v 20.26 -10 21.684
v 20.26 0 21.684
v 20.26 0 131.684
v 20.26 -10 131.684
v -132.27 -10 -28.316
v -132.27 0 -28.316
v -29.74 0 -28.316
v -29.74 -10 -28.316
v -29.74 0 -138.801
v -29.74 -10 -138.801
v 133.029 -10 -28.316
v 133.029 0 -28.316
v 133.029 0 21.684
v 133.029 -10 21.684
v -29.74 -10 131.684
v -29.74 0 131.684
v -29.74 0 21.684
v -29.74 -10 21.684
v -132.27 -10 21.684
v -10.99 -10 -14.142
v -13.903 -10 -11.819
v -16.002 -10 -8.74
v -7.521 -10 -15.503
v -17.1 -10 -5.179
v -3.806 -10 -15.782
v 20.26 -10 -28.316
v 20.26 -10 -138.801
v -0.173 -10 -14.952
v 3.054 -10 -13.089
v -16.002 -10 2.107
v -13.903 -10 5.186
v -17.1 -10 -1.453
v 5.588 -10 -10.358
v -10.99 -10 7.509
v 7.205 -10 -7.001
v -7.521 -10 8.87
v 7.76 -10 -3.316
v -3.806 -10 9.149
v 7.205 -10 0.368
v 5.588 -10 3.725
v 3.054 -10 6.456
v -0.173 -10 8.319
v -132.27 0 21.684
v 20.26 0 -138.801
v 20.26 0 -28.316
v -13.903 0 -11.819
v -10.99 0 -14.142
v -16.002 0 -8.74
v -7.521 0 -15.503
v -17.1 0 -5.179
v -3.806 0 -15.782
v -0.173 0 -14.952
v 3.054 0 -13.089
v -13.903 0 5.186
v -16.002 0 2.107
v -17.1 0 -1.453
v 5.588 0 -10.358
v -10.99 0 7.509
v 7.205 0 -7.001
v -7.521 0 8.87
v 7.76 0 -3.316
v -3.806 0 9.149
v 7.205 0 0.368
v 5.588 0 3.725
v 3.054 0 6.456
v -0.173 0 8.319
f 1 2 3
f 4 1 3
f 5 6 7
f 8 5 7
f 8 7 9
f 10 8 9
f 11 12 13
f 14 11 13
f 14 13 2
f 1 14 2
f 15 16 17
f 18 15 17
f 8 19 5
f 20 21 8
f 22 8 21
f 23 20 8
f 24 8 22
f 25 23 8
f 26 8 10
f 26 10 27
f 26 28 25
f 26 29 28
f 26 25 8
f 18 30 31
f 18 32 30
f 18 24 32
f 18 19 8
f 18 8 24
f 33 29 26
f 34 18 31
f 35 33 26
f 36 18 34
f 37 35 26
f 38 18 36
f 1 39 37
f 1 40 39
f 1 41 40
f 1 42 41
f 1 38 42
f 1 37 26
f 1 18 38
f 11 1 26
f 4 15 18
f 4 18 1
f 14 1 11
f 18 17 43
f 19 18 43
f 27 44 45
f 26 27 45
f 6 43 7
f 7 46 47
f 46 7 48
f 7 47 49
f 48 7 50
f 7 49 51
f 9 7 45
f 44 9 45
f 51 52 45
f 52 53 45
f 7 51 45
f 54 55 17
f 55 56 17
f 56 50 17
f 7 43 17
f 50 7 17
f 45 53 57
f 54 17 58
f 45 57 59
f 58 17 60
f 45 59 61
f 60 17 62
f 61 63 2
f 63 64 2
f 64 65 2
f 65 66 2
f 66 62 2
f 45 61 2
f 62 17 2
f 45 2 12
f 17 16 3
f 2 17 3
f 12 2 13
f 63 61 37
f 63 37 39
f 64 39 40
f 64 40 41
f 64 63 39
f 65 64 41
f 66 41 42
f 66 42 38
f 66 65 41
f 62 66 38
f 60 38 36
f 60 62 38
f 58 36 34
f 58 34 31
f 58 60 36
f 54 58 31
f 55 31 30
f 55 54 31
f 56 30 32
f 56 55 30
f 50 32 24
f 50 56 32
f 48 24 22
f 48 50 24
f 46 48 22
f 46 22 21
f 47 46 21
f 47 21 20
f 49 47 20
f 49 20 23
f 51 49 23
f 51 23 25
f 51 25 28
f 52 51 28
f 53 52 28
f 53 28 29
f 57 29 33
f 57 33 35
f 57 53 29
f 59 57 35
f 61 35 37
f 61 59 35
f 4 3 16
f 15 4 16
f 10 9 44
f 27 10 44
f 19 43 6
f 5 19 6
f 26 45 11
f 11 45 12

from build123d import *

# Parameters (mm, degrees)
F0_R     = 12.5
F1_DEPTH = 10


with BuildPart() as f1:
    # F0 (on Front) → F1 (new body)
    with BuildSketch(Plane.XZ):
        with BuildLine():
            Line((20.260356, 131.683536), (-29.739644, 131.683536))
            Line((-29.739644, 131.683536), (-29.739644, 21.683536))
            Line((-29.739644, 21.683536), (-132.202011, 21.683536))
            ThreePointArc((-132.202011, 21.683536), (-132.236004, 21.471069), (-132.269658, 21.258549))
            Line((-132.269658, 21.258549), (-132.269658, -28.316464))
            Line((-132.269658, -28.316464), (-29.739644, -28.316464))
            Line((-29.739644, -28.316464), (-29.739644, -138.80116))
            Line((-29.739644, -138.80116), (20.260356, -138.80116))
            Line((20.260356, -138.80116), (20.260356, -28.316464))
            Line((20.260356, -28.316464), (133.028674, -28.316464))
            Line((133.028674, -28.316464), (133.028674, 21.683536))
            Line((133.028674, 21.683536), (20.260356, 21.683536))
            Line((20.260356, 21.683536), (20.260356, 131.683536))
        make_face()
        with Locations((-4.739644, -3.316464)):
            Circle(F0_R, mode=Mode.SUBTRACT)
        with BuildLine():
            ThreePointArc((-132.269658, 21.258549), (-132.236004, 21.471069), (-132.202011, 21.683536))
            Line((-132.202011, 21.683536), (-132.269658, 21.683536))
            Line((-132.269658, 21.683536), (-132.269658, 21.258549))
        make_face()
    extrude(amount=F1_DEPTH)


solid = f1.part
